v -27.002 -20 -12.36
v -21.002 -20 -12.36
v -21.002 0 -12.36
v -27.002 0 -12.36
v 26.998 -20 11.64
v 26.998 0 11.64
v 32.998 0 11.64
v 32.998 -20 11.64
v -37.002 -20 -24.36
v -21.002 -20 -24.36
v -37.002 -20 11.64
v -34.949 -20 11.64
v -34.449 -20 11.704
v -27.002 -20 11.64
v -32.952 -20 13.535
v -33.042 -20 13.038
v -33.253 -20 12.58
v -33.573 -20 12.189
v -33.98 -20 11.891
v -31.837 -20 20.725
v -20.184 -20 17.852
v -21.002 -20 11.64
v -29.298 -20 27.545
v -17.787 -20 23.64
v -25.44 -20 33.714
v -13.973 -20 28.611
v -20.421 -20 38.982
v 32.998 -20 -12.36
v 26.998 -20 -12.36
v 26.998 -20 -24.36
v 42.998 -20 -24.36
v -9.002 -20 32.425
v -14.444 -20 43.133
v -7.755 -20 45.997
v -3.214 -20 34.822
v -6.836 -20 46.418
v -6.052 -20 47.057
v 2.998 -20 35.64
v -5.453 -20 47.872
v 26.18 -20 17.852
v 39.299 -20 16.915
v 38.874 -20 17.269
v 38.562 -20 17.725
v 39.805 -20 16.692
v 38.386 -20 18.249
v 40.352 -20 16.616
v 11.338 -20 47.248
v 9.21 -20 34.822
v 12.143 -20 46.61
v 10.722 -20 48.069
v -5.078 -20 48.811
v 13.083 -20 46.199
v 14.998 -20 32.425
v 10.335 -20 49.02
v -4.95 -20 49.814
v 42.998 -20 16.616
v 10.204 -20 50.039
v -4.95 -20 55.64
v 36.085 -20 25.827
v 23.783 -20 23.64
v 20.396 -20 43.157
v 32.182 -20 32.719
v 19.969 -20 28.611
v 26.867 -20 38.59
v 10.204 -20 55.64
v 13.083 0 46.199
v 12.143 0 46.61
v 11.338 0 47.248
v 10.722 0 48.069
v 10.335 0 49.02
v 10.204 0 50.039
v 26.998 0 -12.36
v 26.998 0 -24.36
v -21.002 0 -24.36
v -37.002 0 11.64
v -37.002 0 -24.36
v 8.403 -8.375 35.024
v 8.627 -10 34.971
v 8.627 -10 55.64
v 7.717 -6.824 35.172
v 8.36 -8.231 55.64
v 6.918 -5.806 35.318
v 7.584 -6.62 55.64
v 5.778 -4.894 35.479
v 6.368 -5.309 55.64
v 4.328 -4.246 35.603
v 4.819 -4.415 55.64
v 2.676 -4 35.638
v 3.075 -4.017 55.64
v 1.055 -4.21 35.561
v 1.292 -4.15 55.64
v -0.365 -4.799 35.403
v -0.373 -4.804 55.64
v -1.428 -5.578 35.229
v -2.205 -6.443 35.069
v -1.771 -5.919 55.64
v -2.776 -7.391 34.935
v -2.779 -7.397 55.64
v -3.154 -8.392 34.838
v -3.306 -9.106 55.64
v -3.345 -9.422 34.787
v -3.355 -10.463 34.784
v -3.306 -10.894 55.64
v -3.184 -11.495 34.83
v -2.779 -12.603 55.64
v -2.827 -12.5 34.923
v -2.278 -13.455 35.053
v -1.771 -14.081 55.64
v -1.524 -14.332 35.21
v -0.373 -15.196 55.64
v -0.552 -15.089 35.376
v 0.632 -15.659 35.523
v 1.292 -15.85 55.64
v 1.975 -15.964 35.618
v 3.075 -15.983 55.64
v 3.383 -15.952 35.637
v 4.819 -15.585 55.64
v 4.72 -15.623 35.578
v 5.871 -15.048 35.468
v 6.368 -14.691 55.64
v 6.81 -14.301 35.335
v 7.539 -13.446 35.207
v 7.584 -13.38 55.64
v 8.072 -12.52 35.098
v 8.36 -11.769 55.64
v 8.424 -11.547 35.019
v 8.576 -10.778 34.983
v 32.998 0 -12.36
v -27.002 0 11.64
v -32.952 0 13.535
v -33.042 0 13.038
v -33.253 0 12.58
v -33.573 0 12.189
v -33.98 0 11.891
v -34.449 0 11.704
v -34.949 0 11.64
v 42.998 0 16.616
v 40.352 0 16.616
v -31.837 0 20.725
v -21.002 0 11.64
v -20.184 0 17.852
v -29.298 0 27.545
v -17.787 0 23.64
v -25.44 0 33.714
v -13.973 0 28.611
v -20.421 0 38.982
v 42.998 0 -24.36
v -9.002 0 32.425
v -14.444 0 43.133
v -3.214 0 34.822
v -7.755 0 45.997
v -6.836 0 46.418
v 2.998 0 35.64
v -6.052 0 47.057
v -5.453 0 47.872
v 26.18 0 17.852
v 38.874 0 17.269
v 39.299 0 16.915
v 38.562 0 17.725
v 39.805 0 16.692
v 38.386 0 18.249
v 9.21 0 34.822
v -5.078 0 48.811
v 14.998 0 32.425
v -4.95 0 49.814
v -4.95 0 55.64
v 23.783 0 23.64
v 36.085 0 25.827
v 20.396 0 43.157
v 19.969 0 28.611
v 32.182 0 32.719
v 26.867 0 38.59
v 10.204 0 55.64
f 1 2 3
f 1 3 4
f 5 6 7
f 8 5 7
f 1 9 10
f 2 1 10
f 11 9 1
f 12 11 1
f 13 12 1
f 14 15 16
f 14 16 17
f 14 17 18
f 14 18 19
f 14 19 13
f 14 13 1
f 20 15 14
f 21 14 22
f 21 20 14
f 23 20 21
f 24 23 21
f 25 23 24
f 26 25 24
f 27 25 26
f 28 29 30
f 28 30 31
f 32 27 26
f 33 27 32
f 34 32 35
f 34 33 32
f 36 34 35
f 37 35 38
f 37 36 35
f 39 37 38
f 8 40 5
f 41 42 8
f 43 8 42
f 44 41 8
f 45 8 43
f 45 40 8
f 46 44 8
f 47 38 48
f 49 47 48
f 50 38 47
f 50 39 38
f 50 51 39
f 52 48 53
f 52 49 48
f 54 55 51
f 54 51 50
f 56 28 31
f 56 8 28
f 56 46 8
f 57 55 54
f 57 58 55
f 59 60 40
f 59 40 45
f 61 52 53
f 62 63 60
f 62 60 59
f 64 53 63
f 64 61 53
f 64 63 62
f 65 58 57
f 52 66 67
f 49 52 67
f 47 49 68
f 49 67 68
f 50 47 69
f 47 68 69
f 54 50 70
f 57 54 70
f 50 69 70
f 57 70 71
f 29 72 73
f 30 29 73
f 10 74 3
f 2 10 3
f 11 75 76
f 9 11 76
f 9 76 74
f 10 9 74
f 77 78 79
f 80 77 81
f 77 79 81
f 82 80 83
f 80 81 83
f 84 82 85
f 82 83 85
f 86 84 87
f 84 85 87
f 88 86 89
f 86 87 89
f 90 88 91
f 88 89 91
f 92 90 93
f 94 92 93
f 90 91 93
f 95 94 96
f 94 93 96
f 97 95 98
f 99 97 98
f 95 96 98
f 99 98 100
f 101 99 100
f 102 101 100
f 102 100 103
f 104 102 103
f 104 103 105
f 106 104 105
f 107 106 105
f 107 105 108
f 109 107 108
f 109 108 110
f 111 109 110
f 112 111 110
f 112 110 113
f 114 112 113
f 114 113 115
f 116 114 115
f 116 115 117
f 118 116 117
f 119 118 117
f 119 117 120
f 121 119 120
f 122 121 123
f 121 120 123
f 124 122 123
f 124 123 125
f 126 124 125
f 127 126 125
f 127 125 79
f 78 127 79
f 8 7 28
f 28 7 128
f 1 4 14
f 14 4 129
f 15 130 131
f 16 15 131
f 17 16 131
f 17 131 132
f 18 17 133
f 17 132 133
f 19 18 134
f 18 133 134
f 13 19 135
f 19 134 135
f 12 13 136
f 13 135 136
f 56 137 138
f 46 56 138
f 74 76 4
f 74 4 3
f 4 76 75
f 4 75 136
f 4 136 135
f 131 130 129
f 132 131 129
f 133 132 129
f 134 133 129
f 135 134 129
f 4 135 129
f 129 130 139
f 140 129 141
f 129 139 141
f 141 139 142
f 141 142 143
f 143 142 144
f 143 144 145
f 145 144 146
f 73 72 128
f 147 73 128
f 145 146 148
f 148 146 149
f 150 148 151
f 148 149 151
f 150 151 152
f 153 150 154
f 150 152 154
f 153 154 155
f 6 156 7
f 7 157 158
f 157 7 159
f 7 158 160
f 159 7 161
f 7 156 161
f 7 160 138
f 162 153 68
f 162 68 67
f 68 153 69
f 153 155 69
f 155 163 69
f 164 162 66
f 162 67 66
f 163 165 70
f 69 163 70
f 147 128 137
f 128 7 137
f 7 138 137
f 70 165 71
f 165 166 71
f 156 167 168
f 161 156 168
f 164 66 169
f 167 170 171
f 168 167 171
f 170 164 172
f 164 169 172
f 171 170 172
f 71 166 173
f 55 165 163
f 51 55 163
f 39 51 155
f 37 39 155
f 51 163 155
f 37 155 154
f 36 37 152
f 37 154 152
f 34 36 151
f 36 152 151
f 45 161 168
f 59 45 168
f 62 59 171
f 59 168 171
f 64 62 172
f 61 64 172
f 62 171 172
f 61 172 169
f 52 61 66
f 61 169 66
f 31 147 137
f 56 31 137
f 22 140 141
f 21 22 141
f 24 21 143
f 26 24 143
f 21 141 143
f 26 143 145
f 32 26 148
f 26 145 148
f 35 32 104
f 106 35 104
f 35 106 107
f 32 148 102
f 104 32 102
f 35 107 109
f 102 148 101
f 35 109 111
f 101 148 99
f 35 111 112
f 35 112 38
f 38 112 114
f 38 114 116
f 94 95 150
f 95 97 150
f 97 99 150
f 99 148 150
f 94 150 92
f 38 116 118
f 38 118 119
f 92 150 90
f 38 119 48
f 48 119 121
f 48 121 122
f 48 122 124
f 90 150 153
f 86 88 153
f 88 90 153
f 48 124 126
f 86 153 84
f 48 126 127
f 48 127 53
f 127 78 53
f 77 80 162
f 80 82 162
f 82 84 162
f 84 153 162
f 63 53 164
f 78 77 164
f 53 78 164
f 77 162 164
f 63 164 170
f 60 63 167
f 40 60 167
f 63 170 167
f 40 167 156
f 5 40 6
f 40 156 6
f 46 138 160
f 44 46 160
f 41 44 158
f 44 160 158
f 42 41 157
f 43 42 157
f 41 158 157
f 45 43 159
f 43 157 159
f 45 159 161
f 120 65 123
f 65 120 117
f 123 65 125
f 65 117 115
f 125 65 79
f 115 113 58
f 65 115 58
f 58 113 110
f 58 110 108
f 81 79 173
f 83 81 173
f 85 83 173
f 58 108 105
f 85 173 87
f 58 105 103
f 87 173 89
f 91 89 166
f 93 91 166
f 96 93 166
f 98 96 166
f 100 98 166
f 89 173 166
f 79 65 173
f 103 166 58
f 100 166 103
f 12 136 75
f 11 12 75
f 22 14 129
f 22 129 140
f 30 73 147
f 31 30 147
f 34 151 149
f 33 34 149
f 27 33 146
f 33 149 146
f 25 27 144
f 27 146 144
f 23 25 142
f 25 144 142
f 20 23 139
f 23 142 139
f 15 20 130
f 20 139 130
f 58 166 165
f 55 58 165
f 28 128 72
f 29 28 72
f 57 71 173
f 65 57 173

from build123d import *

# Parameters (mm, degrees)
F1_DEPTH = 20
F2_R     = 6
F3_DEPTH = 80.001


with BuildPart() as f1:
    # F0 (on Front) → F1 (new body)
    with BuildSketch(Plane.XZ):
        with BuildLine():
            Line((-34.949345, 11.64024), (-37.002013, 11.64024))
            Line((-37.002013, 11.64024), (-37.002013, -24.35976))
            Line((-37.002013, -24.35976), (-21.002013, -24.35976))
            Line((-21.002013, -24.35976), (-21.002013, -12.35976))
            Line((-21.002013, -12.35976), (-27.002013, -12.35976))
            Line((-27.002013, -12.35976), (-27.002013, 11.64024))
            Line((-27.002013, 11.64024), (-21.002013, 11.64024))
            ThreePointArc((-21.002013, 11.64024), (2.997987, 35.64024), (26.997987, 11.64024))
            Line((26.997987, 11.64024), (32.997987, 11.64024))
            Line((32.997987, 11.64024), (32.997987, -12.35976))
            Line((32.997987, -12.35976), (26.997987, -12.35976))
            Line((26.997987, -12.35976), (26.997987, -24.35976))
            Line((26.997987, -24.35976), (42.997987, -24.35976))
            Line((42.997987, -24.35976), (42.997987, 16.615835))
            Line((42.997987, 16.615835), (40.352251, 16.615835))
            ThreePointArc((40.352251, 16.615835), (39.074416, 17.077285), (38.386237, 18.248699))
            ThreePointArc((38.386237, 18.248699), (29.686172, 35.800968), (13.083165, 46.198729))
            ThreePointArc((13.083165, 46.198729), (11.003561, 47.638801), (10.203741, 50.038561))
            Line((10.203741, 50.038561), (10.203741, 55.64024))
            Line((10.203741, 55.64024), (-4.950045, 55.64024))
            Line((-4.950045, 55.64024), (-4.950045, 49.814112))
            ThreePointArc((-4.950045, 49.814112), (-5.726754, 47.445485), (-7.755242, 45.996725))
            ThreePointArc((-7.755242, 45.996725), (-25.440396, 33.71417), (-32.952117, 13.534977))
            ThreePointArc((-32.952117, 13.534977), (-33.572851, 12.189288), (-34.949345, 11.64024))
        make_face()
    extrude(amount=F1_DEPTH)

    # F2 (on face) → F3 (cut, through all)
    with BuildSketch(Plane.XY.offset(55.64024)):
        with Locations((2.626848, -10)):
            Circle(F2_R)
    extrude(amount=-F3_DEPTH, mode=Mode.SUBTRACT)


solid = f1.part
